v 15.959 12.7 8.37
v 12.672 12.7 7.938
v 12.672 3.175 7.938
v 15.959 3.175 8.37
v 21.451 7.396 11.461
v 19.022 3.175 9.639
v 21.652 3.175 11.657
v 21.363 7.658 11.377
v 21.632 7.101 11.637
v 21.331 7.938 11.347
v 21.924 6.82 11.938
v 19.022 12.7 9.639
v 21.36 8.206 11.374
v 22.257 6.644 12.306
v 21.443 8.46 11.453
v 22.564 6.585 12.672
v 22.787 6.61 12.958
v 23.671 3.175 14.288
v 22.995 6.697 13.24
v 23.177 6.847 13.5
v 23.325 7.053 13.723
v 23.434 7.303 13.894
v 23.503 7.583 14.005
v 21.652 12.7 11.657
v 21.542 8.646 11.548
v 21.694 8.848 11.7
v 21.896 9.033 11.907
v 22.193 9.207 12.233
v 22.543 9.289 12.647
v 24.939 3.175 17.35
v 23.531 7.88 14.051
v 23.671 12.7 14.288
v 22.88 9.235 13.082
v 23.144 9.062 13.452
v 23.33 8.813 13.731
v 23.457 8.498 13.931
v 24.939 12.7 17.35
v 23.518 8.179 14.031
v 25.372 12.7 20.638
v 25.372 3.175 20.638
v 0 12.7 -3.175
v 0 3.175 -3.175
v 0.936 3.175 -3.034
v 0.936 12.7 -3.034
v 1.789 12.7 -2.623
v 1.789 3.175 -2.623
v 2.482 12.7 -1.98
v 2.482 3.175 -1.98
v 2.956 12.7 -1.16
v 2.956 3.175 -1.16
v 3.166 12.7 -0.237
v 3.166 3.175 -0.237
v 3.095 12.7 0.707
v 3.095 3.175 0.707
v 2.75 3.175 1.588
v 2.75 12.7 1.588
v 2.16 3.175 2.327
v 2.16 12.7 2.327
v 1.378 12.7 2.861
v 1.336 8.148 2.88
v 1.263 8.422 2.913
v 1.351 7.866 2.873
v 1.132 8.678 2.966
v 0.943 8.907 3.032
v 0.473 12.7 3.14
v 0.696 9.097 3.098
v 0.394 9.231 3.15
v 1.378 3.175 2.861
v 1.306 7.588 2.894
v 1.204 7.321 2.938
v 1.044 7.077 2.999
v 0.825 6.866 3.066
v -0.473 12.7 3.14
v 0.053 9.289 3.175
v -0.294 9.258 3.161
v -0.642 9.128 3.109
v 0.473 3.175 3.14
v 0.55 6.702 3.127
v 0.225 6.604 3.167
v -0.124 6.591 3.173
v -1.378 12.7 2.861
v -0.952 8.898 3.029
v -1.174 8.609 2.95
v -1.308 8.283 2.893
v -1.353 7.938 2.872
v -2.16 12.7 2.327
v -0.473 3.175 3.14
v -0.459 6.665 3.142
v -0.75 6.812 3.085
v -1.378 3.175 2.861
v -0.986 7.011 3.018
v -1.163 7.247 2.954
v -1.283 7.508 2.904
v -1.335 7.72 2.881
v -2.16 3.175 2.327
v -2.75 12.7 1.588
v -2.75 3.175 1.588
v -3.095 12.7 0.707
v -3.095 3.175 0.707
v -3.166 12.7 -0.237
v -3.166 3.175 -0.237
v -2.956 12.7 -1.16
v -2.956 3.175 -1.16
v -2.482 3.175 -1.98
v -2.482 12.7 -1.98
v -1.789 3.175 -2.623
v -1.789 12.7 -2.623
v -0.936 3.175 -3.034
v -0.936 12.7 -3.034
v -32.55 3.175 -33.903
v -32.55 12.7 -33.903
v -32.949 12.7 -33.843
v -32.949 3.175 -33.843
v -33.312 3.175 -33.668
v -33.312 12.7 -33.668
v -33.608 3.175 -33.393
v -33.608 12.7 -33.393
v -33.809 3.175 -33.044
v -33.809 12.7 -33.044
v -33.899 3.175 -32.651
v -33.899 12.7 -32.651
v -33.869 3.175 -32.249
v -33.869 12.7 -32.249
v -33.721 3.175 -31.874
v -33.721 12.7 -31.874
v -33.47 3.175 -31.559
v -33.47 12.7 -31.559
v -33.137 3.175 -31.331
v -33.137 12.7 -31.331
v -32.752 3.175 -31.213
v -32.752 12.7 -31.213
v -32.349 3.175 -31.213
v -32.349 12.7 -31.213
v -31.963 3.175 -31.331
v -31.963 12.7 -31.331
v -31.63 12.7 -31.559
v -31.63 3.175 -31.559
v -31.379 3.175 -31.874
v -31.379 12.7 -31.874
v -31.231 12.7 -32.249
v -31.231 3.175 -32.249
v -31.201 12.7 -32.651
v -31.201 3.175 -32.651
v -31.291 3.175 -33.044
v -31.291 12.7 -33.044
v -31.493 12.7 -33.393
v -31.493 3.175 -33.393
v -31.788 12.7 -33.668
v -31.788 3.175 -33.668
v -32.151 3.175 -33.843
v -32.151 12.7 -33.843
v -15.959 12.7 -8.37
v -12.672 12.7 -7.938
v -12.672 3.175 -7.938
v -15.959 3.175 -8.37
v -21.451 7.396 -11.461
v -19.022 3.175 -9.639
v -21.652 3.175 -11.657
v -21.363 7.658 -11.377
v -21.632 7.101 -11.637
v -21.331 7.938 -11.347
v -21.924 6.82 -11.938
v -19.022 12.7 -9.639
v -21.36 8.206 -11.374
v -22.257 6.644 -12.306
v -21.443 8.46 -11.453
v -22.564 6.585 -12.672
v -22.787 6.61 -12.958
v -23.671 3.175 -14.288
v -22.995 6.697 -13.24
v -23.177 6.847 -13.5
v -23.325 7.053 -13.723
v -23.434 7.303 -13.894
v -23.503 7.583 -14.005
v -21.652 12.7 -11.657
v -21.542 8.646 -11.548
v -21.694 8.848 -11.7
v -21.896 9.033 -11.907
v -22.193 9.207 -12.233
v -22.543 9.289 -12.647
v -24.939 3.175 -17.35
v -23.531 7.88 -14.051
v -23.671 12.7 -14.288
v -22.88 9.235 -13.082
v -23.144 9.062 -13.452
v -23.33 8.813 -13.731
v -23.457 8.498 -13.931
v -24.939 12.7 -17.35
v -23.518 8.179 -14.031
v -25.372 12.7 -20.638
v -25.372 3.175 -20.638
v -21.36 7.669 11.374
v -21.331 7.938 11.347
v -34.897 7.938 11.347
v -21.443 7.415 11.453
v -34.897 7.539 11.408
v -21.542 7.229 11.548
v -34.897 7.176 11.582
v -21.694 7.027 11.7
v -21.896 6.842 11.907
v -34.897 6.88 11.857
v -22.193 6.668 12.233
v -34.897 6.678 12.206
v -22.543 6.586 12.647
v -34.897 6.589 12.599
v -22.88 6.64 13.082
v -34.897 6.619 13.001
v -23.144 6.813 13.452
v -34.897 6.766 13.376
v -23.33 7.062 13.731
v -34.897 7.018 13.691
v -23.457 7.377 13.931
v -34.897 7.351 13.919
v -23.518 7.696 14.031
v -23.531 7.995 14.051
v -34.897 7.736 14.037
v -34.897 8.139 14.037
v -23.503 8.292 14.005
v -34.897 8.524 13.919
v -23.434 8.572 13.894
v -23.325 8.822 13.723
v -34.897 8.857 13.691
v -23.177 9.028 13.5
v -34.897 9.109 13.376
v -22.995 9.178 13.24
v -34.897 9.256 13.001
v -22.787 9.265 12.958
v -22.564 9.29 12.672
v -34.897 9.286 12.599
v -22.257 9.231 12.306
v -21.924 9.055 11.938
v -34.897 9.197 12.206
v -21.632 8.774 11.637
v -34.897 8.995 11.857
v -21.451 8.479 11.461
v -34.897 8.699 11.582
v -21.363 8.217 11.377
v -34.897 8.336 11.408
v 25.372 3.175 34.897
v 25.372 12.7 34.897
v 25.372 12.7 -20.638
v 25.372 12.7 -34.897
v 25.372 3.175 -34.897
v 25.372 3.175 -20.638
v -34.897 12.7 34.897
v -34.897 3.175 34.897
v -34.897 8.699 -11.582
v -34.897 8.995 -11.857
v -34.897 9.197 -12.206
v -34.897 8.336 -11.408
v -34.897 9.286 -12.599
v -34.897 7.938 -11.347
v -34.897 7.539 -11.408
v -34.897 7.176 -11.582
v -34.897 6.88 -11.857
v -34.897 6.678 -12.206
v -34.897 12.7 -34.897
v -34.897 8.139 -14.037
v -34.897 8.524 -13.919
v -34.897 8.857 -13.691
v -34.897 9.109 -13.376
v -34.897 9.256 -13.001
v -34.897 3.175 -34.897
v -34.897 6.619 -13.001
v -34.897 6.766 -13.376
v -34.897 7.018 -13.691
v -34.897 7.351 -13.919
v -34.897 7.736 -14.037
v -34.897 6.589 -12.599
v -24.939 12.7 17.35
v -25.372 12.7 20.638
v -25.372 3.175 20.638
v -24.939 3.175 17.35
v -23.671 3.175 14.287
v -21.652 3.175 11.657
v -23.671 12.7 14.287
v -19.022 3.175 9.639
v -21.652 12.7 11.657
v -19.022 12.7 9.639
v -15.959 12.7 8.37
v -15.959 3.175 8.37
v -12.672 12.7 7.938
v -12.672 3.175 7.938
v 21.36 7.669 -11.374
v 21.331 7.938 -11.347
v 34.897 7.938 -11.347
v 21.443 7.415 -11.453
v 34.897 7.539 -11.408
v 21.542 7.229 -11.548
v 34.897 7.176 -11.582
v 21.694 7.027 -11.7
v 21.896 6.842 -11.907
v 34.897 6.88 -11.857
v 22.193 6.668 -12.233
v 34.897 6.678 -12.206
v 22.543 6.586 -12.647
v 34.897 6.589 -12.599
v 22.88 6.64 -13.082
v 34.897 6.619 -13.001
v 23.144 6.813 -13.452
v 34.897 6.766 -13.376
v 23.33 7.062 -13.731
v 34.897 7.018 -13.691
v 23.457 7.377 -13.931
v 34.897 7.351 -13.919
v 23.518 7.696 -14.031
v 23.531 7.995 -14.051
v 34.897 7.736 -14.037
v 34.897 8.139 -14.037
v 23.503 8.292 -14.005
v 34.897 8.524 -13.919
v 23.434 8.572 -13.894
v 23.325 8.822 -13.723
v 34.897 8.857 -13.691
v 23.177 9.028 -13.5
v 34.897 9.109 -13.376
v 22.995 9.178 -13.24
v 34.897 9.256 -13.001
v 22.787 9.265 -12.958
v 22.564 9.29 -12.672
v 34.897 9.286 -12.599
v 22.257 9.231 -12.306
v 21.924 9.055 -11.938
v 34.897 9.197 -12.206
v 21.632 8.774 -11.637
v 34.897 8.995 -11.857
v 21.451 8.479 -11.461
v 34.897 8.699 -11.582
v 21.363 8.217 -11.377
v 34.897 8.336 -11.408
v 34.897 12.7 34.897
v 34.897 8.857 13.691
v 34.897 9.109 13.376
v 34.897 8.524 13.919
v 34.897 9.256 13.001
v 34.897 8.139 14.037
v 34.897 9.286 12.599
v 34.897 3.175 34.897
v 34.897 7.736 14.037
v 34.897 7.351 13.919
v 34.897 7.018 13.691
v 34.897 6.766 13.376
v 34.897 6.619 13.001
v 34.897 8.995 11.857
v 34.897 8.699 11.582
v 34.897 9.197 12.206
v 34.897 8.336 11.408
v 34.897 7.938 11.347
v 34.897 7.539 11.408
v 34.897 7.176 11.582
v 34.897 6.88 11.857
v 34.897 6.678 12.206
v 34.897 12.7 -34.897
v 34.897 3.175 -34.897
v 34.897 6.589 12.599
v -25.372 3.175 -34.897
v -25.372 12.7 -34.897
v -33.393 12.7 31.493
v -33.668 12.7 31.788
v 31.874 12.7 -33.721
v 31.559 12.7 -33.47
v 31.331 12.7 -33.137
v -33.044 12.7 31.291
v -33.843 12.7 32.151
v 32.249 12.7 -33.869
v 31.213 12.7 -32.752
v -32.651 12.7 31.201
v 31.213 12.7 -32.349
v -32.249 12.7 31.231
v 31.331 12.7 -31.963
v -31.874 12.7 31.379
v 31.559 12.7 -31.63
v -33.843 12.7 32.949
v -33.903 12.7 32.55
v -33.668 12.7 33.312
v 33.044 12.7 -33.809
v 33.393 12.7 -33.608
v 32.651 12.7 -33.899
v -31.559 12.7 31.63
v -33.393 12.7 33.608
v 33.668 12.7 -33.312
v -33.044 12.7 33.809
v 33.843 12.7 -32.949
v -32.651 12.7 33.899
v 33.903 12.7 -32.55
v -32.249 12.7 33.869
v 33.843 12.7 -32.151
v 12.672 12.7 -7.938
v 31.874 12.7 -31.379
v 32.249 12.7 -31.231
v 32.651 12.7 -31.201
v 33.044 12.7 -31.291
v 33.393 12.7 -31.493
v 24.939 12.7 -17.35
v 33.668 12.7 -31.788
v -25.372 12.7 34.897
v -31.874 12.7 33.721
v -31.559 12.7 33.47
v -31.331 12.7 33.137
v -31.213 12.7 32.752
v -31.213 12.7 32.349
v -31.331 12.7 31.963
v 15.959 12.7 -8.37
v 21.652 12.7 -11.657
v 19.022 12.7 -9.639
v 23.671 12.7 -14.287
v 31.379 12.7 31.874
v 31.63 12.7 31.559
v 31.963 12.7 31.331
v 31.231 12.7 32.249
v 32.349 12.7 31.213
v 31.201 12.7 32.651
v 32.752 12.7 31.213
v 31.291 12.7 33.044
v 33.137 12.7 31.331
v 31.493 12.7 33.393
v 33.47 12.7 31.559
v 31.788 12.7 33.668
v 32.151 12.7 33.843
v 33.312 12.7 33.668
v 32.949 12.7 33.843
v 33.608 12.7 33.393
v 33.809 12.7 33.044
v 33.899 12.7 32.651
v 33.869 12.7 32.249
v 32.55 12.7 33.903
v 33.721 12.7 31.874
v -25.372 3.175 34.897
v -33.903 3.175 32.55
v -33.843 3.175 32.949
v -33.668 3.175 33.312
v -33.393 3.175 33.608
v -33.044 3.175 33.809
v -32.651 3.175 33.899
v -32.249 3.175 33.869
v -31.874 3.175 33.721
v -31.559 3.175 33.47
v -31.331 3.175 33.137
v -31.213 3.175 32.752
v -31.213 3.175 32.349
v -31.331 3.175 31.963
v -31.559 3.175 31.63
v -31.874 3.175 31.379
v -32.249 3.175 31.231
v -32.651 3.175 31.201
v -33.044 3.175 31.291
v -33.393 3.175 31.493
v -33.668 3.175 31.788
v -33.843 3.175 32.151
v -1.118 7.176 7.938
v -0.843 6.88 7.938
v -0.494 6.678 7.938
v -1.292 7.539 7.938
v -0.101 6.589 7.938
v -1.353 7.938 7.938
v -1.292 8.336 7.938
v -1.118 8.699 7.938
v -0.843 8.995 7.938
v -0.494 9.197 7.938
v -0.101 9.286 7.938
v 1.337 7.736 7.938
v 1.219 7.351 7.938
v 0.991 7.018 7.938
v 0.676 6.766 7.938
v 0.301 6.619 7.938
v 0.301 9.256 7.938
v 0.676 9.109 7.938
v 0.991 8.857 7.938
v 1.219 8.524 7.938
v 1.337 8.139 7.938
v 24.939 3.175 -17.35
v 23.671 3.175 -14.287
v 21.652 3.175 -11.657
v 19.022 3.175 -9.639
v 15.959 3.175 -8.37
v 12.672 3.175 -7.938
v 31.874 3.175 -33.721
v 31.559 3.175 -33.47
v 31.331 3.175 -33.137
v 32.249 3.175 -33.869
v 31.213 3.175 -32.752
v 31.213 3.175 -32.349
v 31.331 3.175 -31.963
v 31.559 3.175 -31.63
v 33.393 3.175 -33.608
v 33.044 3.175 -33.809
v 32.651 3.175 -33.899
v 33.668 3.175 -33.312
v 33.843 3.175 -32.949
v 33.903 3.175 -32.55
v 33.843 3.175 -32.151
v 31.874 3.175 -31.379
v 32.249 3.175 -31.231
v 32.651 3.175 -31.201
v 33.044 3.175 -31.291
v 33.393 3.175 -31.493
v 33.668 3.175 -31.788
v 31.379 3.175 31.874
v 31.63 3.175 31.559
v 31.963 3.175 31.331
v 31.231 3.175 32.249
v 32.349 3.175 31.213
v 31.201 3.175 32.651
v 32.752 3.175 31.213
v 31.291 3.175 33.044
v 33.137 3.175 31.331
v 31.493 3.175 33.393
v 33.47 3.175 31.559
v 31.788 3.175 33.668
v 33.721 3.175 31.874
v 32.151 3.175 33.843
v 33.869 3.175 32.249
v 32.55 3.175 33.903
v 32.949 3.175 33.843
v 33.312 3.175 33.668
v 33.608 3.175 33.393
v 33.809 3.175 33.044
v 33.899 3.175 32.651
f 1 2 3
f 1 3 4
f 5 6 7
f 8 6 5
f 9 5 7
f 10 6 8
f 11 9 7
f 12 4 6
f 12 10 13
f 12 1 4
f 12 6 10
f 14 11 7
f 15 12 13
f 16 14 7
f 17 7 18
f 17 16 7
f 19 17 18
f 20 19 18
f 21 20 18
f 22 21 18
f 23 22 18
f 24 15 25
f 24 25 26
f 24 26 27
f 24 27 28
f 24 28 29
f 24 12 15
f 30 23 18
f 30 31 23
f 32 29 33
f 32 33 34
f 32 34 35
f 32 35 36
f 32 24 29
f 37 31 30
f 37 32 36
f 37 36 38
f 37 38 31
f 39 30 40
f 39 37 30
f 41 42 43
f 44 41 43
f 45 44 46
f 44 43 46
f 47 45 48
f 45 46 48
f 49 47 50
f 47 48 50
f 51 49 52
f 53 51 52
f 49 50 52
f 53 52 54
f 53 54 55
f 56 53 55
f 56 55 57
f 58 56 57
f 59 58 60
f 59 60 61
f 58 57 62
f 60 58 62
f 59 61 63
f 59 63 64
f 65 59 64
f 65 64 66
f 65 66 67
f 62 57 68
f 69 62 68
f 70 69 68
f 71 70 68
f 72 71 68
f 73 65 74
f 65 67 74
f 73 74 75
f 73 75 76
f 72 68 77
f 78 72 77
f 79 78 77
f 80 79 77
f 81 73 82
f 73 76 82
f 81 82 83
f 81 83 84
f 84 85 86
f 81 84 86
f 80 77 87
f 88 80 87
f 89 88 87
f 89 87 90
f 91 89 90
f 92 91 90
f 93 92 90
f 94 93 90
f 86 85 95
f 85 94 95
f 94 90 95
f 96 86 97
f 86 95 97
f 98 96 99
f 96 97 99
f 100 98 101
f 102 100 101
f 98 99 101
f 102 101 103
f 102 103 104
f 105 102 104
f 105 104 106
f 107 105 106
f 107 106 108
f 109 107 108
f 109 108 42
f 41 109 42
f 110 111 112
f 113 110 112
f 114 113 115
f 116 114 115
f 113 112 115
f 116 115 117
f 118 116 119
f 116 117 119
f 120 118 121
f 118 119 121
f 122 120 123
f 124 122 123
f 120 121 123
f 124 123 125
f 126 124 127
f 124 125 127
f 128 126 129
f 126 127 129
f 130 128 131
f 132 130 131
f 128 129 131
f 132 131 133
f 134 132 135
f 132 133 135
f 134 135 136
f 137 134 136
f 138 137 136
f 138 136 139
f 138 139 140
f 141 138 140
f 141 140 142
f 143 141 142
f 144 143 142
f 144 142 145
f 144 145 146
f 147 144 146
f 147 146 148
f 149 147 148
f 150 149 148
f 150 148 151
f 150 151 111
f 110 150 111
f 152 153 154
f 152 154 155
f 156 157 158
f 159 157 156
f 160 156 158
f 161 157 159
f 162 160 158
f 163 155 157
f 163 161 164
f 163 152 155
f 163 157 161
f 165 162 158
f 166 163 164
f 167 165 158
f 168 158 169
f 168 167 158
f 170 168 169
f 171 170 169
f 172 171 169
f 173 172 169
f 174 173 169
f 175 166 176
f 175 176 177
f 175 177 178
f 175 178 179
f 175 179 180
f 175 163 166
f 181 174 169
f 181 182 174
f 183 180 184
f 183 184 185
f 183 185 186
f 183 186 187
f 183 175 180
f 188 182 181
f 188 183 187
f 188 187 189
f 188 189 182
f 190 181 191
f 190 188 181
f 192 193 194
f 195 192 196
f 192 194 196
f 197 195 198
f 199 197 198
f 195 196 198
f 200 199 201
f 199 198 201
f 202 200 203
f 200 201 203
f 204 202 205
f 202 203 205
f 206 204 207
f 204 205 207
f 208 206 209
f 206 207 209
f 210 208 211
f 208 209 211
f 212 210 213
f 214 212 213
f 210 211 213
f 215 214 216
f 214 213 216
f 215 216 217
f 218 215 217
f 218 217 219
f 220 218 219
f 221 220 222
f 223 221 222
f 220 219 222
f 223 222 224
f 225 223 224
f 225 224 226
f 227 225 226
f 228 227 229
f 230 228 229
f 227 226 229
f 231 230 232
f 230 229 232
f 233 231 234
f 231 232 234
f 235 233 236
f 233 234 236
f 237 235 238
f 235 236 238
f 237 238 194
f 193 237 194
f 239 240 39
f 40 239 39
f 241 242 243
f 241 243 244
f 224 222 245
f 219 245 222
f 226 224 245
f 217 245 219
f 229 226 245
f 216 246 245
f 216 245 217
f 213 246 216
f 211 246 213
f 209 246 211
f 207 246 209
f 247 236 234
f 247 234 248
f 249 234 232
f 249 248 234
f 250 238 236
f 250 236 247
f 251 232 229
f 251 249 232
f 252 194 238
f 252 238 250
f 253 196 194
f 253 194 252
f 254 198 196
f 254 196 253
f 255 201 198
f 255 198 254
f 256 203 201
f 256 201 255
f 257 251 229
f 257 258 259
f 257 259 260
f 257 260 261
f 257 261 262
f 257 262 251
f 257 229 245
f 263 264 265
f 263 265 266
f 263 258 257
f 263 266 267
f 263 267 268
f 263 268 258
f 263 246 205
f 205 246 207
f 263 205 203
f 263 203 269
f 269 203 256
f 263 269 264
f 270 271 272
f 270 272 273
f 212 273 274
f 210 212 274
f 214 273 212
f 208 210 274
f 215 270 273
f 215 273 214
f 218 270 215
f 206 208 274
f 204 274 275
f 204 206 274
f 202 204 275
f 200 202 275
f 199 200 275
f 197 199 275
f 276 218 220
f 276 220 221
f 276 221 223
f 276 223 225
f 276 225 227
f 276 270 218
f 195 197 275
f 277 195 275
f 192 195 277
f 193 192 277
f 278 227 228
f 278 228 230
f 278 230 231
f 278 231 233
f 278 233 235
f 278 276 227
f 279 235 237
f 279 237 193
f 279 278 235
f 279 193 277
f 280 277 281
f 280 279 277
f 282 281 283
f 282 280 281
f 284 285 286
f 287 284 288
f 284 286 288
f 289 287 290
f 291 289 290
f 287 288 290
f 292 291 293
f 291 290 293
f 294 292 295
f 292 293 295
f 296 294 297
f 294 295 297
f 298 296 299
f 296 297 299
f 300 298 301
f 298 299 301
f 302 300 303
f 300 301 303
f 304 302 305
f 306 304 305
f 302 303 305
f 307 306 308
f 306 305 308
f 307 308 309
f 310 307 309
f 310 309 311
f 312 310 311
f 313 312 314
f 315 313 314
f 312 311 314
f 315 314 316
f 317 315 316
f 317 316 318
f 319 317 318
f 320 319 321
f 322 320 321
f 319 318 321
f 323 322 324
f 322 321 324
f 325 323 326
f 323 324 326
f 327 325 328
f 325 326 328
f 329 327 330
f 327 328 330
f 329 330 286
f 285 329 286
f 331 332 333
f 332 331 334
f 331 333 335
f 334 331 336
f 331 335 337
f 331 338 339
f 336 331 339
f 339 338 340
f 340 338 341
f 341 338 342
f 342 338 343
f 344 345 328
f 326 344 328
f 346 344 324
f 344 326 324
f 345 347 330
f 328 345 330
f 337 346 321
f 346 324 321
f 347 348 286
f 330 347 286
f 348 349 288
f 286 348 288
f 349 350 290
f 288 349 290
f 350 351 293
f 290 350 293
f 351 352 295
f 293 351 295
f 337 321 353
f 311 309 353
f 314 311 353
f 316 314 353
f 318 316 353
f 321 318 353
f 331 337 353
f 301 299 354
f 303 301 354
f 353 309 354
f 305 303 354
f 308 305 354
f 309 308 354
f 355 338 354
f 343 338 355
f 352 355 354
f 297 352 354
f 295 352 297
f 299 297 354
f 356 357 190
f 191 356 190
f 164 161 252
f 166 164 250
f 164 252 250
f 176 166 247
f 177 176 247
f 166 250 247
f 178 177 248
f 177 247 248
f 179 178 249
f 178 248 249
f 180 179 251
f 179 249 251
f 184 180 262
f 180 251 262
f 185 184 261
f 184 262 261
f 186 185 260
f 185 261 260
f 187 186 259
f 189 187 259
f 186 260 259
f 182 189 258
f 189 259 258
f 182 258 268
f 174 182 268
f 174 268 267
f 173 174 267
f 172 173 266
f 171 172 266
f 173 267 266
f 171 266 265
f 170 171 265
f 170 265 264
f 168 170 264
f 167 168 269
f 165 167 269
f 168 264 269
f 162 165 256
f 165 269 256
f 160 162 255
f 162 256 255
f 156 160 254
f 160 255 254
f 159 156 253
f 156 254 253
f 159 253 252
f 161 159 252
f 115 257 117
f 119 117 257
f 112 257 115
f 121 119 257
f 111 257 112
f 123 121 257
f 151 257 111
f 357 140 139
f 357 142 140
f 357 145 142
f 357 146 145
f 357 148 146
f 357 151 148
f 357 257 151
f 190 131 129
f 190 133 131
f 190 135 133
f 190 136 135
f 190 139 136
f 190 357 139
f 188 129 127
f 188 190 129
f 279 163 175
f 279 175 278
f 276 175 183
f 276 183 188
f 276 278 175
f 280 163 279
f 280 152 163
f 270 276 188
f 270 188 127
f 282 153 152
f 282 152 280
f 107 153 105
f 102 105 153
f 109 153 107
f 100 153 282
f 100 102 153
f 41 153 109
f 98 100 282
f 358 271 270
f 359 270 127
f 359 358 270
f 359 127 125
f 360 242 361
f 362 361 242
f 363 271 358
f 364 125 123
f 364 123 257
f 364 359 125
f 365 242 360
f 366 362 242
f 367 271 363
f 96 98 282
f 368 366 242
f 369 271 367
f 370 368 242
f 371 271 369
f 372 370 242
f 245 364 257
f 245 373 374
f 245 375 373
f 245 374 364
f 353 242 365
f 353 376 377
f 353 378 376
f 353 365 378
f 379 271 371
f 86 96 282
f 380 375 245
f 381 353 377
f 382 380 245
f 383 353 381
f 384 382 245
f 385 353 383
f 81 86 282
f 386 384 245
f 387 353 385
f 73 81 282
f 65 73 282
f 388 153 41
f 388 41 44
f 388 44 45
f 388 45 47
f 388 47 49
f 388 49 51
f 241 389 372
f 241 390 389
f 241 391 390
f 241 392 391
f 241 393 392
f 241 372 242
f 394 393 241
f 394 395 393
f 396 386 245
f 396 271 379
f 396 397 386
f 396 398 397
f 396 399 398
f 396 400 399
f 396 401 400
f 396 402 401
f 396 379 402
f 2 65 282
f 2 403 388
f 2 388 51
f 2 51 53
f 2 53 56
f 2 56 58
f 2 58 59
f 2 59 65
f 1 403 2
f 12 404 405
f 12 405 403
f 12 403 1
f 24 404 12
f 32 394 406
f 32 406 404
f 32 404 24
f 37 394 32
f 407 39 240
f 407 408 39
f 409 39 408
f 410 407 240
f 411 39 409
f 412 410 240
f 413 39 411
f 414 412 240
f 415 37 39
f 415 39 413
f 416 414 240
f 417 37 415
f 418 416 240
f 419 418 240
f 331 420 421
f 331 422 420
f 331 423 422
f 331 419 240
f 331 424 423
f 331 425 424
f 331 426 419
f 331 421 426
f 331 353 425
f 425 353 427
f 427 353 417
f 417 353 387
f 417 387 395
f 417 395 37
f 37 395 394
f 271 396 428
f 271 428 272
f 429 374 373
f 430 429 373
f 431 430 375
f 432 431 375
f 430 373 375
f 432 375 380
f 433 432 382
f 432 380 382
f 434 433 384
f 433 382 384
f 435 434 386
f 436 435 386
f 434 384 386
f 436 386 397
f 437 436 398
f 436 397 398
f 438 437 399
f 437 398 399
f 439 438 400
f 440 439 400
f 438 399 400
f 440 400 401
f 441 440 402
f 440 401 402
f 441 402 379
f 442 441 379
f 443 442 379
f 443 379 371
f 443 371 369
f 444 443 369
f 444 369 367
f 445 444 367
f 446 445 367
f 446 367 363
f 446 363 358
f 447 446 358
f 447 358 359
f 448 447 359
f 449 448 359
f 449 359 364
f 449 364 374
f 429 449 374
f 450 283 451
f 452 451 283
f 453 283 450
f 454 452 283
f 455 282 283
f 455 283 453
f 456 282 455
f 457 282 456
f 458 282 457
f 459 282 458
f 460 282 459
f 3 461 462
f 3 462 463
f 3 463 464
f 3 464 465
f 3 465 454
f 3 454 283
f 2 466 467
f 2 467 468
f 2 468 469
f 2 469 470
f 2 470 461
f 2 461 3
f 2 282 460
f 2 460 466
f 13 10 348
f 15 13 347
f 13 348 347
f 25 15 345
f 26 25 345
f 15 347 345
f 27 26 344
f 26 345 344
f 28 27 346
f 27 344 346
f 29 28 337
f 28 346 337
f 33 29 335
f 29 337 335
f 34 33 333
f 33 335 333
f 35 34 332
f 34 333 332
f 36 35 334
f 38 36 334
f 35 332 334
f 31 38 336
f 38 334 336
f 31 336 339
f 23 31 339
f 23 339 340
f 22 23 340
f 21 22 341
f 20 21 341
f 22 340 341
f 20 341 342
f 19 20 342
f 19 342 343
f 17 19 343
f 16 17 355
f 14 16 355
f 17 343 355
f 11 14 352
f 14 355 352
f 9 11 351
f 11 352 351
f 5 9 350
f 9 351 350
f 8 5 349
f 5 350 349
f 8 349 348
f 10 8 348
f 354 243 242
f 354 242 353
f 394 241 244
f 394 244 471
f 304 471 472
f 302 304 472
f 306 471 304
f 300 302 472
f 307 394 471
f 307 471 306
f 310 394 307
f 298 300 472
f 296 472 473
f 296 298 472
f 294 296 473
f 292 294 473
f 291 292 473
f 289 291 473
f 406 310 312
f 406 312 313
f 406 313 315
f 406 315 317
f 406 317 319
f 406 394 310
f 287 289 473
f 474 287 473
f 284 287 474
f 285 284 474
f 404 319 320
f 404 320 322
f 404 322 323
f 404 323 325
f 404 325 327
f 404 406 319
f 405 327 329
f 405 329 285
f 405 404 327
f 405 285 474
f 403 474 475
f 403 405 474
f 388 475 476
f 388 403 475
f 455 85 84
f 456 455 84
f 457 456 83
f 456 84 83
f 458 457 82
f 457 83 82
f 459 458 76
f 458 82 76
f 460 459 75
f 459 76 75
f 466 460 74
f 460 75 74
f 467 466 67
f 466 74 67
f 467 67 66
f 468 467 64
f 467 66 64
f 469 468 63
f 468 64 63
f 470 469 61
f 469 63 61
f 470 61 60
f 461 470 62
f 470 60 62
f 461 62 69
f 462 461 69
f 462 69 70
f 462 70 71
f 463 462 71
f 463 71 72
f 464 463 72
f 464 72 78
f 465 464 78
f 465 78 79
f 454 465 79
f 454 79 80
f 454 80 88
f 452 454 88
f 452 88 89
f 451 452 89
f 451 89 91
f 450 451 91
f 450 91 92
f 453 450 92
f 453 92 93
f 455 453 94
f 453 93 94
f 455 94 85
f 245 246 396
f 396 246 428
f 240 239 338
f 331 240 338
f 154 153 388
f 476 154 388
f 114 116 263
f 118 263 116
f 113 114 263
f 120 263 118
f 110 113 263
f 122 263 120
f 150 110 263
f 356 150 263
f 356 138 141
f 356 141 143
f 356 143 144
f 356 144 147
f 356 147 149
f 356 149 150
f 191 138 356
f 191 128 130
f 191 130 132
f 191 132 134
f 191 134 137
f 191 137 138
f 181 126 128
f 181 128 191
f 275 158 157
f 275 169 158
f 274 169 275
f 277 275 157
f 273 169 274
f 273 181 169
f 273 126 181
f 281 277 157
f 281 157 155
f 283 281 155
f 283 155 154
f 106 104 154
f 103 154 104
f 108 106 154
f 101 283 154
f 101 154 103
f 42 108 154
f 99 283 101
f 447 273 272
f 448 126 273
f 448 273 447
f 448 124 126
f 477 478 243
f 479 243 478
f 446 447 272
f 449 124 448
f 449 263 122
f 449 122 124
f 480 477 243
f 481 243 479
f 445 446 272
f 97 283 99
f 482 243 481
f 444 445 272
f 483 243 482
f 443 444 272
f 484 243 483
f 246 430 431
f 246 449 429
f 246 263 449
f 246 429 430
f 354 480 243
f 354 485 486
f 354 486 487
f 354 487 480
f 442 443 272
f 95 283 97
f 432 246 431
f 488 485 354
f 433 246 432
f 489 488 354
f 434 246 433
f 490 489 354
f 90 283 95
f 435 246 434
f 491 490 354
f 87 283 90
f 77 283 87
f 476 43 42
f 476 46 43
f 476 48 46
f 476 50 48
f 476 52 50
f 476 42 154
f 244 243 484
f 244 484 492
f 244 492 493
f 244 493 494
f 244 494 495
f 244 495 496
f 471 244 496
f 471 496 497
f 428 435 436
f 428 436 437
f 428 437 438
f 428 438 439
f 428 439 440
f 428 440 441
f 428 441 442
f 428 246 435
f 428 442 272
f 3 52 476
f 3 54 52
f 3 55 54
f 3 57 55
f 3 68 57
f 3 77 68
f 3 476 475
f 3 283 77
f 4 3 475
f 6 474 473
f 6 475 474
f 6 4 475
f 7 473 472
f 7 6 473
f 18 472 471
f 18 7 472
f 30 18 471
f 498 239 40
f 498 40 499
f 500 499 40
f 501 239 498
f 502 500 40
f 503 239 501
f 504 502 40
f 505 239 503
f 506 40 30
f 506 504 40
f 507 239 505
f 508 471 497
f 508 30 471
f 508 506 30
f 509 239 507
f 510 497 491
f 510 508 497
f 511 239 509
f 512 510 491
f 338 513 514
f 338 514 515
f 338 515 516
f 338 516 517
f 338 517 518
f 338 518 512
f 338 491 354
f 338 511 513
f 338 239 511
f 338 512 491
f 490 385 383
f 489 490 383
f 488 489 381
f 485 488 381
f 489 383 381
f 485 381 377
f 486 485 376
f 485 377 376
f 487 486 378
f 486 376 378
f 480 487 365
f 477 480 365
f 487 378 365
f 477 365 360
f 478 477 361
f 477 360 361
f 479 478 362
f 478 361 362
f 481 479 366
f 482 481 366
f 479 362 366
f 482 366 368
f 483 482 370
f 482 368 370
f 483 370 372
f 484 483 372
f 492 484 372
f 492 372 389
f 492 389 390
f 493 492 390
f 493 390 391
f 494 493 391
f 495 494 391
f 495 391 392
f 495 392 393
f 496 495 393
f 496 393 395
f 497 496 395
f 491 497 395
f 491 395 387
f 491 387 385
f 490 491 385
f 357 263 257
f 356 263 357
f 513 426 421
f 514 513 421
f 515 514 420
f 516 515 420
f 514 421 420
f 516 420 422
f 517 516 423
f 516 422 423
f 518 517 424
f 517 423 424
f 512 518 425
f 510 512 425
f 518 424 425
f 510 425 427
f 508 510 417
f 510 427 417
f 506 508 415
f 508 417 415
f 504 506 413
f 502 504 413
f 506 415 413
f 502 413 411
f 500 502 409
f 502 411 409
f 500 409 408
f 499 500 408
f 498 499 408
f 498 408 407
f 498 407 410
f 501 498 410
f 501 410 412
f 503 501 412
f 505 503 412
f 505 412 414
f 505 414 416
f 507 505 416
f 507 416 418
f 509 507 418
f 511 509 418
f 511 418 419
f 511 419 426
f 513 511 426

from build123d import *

# Parameters (mm, degrees)
SKETCH1_W                 = 76.2
SKETCH1_H                 = 76.2
BOSS_EXTRUDE1_DEPTH       = 3.175
SKETCH2_W                 = 69.79412
SKETCH2_H                 = 69.79412
BOSS_EXTRUDE2_DEPTH       = 9.525
F_6_32_TAPPED_HOLE1_D     = 2.7051
CIRPATTERN1_COUNT         = 4
SKETCH14_R                = 3.175
CUT_EXTRUDE1_DEPTH        = 56.358016583
SKETCH15_W                = 50.74412
SKETCH15_H                = 26.95956
CUT_EXTRUDE2_DEPTH        = 9.525
FILLET1_R                 = 12.7
F_6_32_TAPPED_HOLE2_D     = 2.7051
F_6_32_TAPPED_HOLE2_DEPTH = 9.652
F_6_32_TAPPED_HOLE2_TIP   = 0.81269403
FILLET1_OF_MIRROR3_R      = 12.7
SKETCH21_W                = 76.2
SKETCH21_H                = 76.2
CUT_EXTRUDE3_DEPTH        = 3.175


with BuildPart() as part:
    # Sketch1 → Boss-Extrude1 (new body)
    with BuildSketch(Plane(origin=(0, 0, 0), x_dir=(1, 0, 0), z_dir=(0, 1, 0))):
        Rectangle(SKETCH1_W, SKETCH1_H)
    extrude(amount=BOSS_EXTRUDE1_DEPTH)

    # Sketch2 → Boss-Extrude2 (add)
    with BuildSketch(Plane(origin=(0, 3.175, 0), x_dir=(1, 0, 0), z_dir=(0, 1, 0))):
        Rectangle(SKETCH2_W, SKETCH2_H)
    extrude(amount=BOSS_EXTRUDE2_DEPTH)

    # Sketch9 → #6-32 Tapped Hole3 (revolve, cut)
    with BuildSketch(Plane(origin=(34.89706, 7.9375, 12.7), x_dir=(0, 0, -1), z_dir=(0, 1, 0))):
        Polygon((0, 0), (0, 11.98869403), (1.35255, 11.176), (1.35255, 0), align=None)
    f_6_32_tapped_hole3 = revolve(axis=Axis((41.24706, 7.9375, 12.7), (-1, 0, 0)), mode=Mode.SUBTRACT)

    # Mirror1: #6-32 Tapped Hole3 across plane
    add(f_6_32_tapped_hole3.mirror(Plane.XY), mode=Mode.SUBTRACT)

    # Mirror2: #6-32 Tapped Hole3 across plane
    add(f_6_32_tapped_hole3.mirror(Plane(origin=(0, 0, 0), x_dir=(0, 0, 1), z_dir=(1, 0, 0))), mode=Mode.SUBTRACT)

    # Mirror2 copy 1 sketch → Mirror2 copy 1 (revolve, cut)
    with BuildSketch(Plane(origin=(-34.89706, 7.9375, -12.7), x_dir=(0, 0, 1), z_dir=(0, 1, 0))):
        Polygon((0, 0), (0, 11.98869403), (1.35255, 11.176), (1.35255, 0), align=None)
    revolve(axis=Axis((-41.24706, 7.9375, -12.7), (1, 0, 0)), mode=Mode.SUBTRACT)

    # #6-32 Tapped Hole1 (through all)
    with Locations(Plane(origin=(0, 0, 0), x_dir=(-1, 0, 0), z_dir=(0, -1, 0))):
        with Locations((-32.5501, 32.5501)):
            f_6_32_tapped_hole1 = Hole(F_6_32_TAPPED_HOLE1_D / 2)

    # CirPattern1: #6-32 Tapped Hole1 ×4 about axis
    cirpattern1_axis = Axis((0, 0, 0), (0, 1, 0))
    for i in range(1, CIRPATTERN1_COUNT):
        add(f_6_32_tapped_hole1.rotate(cirpattern1_axis, i * 360 / CIRPATTERN1_COUNT), mode=Mode.SUBTRACT)

    # Sketch14 → Cut-Extrude1 (cut, through all)
    with BuildSketch(Plane.XZ):
        with Locations(Location((0, 0, 0), (0, 0, 270))):
            Circle(SKETCH14_R)
    extrude(amount=-CUT_EXTRUDE1_DEPTH, mode=Mode.SUBTRACT)

    # Sketch15 → Cut-Extrude2 (cut)
    with BuildSketch(Plane(origin=(0, 12.7, 0), x_dir=(1, 0, 0), z_dir=(0, 1, 0))):
        with Locations((0, -21.41728)):
            Rectangle(SKETCH15_W, SKETCH15_H)
    cut_extrude2 = extrude(amount=-CUT_EXTRUDE2_DEPTH, mode=Mode.SUBTRACT)

    # Fillet1
    # the kernel refuses this fillet: 12.7 mm, written as the material it adds along each edge
    with BuildSketch(Plane(origin=(25.37206, 12.7, 7.9375), x_dir=(0, 0, 1), z_dir=(0, -1, 0))) as fillet1_piece_1_section:
        with BuildLine():
            CenterArc((FILLET1_R, FILLET1_R), FILLET1_R, 180, 90)
            Line((0, FILLET1_R), (0, 0))
            Line((0, 0), (FILLET1_R, 0))
        make_face()
    fillet1_piece_1 = extrude(amount=9.525, mode=Mode.PRIVATE)
    fillet1_piece_1 = fillet1_piece_1 - Plane(origin=(22.423937315, 7.9375, 12.7), x_dir=(0, 0, -1), z_dir=(1, 0, 0)) * Cylinder(1.35255, 70, mode=Mode.PRIVATE)
    add(fillet1_piece_1)
    with BuildSketch(Plane(origin=(-25.37206, 12.7, 7.9375), x_dir=(1, 0, 0), z_dir=(0, -1, 0))) as fillet1_piece_2_section:
        with BuildLine():
            CenterArc((FILLET1_R, FILLET1_R), FILLET1_R, 180, 90)
            Line((0, FILLET1_R), (0, 0))
            Line((0, 0), (FILLET1_R, 0))
        make_face()
    fillet1_piece_2 = extrude(amount=9.525, mode=Mode.PRIVATE)
    fillet1_piece_2 = fillet1_piece_2 - Plane(origin=(-22.423935797, 7.9375, 12.7), x_dir=(0, 0, -1), z_dir=(-1, 0, 0)) * Cylinder(1.35255, 70, mode=Mode.PRIVATE)
    add(fillet1_piece_2)

    # #6-32 Tapped Hole2
    with Locations(Plane.XY.offset(7.9375)):
        with Locations((0, 7.9375)):
            Hole(F_6_32_TAPPED_HOLE2_D / 2, depth=F_6_32_TAPPED_HOLE2_DEPTH)
            with Locations((0, 0, -(F_6_32_TAPPED_HOLE2_DEPTH + F_6_32_TAPPED_HOLE2_TIP / 2))):  # 118° drill point
                Cone(0, F_6_32_TAPPED_HOLE2_D / 2, F_6_32_TAPPED_HOLE2_TIP, mode=Mode.SUBTRACT)

    # Mirror3: Cut-Extrude2 across plane
    add(cut_extrude2.mirror(Plane.XY), mode=Mode.SUBTRACT)

    # Fillet1 of Mirror3
    # the kernel refuses this fillet: 12.7 mm, written as the material it adds along each edge
    with BuildSketch(Plane(origin=(25.37206, 12.7, -7.9375), x_dir=(-1, 0, 0), z_dir=(0, -1, 0))) as fillet1_of_mirror3_piece_1_section:
        with BuildLine():
            CenterArc((FILLET1_OF_MIRROR3_R, FILLET1_OF_MIRROR3_R), FILLET1_OF_MIRROR3_R, 180, 90)
            Line((0, FILLET1_OF_MIRROR3_R), (0, 0))
            Line((0, 0), (FILLET1_OF_MIRROR3_R, 0))
        make_face()
    fillet1_of_mirror3_piece_1 = extrude(amount=9.525, mode=Mode.PRIVATE)
    fillet1_of_mirror3_piece_1 = fillet1_of_mirror3_piece_1 - Plane(origin=(22.423935797, 7.9375, -12.7), x_dir=(0, 0, 1), z_dir=(1, 0, 0)) * Cylinder(1.35255, 70, mode=Mode.PRIVATE)
    add(fillet1_of_mirror3_piece_1)
    with BuildSketch(Plane(origin=(-25.37206, 12.7, -7.9375), x_dir=(0, 0, -1), z_dir=(0, -1, 0))) as fillet1_of_mirror3_piece_2_section:
        with BuildLine():
            CenterArc((FILLET1_OF_MIRROR3_R, FILLET1_OF_MIRROR3_R), FILLET1_OF_MIRROR3_R, 180, 90)
            Line((0, FILLET1_OF_MIRROR3_R), (0, 0))
            Line((0, 0), (FILLET1_OF_MIRROR3_R, 0))
        make_face()
    fillet1_of_mirror3_piece_2 = extrude(amount=9.525, mode=Mode.PRIVATE)
    fillet1_of_mirror3_piece_2 = fillet1_of_mirror3_piece_2 - Plane(origin=(-22.423937315, 7.9375, -12.7), x_dir=(0, 0, 1), z_dir=(-1, 0, 0)) * Cylinder(1.35255, 70, mode=Mode.PRIVATE)
    add(fillet1_of_mirror3_piece_2)

    # Sketch21 → Cut-Extrude3 (cut)
    with BuildSketch(Plane.XZ):
        Rectangle(SKETCH21_W, SKETCH21_H)
    extrude(amount=-CUT_EXTRUDE3_DEPTH, mode=Mode.SUBTRACT)


solid = part.part
